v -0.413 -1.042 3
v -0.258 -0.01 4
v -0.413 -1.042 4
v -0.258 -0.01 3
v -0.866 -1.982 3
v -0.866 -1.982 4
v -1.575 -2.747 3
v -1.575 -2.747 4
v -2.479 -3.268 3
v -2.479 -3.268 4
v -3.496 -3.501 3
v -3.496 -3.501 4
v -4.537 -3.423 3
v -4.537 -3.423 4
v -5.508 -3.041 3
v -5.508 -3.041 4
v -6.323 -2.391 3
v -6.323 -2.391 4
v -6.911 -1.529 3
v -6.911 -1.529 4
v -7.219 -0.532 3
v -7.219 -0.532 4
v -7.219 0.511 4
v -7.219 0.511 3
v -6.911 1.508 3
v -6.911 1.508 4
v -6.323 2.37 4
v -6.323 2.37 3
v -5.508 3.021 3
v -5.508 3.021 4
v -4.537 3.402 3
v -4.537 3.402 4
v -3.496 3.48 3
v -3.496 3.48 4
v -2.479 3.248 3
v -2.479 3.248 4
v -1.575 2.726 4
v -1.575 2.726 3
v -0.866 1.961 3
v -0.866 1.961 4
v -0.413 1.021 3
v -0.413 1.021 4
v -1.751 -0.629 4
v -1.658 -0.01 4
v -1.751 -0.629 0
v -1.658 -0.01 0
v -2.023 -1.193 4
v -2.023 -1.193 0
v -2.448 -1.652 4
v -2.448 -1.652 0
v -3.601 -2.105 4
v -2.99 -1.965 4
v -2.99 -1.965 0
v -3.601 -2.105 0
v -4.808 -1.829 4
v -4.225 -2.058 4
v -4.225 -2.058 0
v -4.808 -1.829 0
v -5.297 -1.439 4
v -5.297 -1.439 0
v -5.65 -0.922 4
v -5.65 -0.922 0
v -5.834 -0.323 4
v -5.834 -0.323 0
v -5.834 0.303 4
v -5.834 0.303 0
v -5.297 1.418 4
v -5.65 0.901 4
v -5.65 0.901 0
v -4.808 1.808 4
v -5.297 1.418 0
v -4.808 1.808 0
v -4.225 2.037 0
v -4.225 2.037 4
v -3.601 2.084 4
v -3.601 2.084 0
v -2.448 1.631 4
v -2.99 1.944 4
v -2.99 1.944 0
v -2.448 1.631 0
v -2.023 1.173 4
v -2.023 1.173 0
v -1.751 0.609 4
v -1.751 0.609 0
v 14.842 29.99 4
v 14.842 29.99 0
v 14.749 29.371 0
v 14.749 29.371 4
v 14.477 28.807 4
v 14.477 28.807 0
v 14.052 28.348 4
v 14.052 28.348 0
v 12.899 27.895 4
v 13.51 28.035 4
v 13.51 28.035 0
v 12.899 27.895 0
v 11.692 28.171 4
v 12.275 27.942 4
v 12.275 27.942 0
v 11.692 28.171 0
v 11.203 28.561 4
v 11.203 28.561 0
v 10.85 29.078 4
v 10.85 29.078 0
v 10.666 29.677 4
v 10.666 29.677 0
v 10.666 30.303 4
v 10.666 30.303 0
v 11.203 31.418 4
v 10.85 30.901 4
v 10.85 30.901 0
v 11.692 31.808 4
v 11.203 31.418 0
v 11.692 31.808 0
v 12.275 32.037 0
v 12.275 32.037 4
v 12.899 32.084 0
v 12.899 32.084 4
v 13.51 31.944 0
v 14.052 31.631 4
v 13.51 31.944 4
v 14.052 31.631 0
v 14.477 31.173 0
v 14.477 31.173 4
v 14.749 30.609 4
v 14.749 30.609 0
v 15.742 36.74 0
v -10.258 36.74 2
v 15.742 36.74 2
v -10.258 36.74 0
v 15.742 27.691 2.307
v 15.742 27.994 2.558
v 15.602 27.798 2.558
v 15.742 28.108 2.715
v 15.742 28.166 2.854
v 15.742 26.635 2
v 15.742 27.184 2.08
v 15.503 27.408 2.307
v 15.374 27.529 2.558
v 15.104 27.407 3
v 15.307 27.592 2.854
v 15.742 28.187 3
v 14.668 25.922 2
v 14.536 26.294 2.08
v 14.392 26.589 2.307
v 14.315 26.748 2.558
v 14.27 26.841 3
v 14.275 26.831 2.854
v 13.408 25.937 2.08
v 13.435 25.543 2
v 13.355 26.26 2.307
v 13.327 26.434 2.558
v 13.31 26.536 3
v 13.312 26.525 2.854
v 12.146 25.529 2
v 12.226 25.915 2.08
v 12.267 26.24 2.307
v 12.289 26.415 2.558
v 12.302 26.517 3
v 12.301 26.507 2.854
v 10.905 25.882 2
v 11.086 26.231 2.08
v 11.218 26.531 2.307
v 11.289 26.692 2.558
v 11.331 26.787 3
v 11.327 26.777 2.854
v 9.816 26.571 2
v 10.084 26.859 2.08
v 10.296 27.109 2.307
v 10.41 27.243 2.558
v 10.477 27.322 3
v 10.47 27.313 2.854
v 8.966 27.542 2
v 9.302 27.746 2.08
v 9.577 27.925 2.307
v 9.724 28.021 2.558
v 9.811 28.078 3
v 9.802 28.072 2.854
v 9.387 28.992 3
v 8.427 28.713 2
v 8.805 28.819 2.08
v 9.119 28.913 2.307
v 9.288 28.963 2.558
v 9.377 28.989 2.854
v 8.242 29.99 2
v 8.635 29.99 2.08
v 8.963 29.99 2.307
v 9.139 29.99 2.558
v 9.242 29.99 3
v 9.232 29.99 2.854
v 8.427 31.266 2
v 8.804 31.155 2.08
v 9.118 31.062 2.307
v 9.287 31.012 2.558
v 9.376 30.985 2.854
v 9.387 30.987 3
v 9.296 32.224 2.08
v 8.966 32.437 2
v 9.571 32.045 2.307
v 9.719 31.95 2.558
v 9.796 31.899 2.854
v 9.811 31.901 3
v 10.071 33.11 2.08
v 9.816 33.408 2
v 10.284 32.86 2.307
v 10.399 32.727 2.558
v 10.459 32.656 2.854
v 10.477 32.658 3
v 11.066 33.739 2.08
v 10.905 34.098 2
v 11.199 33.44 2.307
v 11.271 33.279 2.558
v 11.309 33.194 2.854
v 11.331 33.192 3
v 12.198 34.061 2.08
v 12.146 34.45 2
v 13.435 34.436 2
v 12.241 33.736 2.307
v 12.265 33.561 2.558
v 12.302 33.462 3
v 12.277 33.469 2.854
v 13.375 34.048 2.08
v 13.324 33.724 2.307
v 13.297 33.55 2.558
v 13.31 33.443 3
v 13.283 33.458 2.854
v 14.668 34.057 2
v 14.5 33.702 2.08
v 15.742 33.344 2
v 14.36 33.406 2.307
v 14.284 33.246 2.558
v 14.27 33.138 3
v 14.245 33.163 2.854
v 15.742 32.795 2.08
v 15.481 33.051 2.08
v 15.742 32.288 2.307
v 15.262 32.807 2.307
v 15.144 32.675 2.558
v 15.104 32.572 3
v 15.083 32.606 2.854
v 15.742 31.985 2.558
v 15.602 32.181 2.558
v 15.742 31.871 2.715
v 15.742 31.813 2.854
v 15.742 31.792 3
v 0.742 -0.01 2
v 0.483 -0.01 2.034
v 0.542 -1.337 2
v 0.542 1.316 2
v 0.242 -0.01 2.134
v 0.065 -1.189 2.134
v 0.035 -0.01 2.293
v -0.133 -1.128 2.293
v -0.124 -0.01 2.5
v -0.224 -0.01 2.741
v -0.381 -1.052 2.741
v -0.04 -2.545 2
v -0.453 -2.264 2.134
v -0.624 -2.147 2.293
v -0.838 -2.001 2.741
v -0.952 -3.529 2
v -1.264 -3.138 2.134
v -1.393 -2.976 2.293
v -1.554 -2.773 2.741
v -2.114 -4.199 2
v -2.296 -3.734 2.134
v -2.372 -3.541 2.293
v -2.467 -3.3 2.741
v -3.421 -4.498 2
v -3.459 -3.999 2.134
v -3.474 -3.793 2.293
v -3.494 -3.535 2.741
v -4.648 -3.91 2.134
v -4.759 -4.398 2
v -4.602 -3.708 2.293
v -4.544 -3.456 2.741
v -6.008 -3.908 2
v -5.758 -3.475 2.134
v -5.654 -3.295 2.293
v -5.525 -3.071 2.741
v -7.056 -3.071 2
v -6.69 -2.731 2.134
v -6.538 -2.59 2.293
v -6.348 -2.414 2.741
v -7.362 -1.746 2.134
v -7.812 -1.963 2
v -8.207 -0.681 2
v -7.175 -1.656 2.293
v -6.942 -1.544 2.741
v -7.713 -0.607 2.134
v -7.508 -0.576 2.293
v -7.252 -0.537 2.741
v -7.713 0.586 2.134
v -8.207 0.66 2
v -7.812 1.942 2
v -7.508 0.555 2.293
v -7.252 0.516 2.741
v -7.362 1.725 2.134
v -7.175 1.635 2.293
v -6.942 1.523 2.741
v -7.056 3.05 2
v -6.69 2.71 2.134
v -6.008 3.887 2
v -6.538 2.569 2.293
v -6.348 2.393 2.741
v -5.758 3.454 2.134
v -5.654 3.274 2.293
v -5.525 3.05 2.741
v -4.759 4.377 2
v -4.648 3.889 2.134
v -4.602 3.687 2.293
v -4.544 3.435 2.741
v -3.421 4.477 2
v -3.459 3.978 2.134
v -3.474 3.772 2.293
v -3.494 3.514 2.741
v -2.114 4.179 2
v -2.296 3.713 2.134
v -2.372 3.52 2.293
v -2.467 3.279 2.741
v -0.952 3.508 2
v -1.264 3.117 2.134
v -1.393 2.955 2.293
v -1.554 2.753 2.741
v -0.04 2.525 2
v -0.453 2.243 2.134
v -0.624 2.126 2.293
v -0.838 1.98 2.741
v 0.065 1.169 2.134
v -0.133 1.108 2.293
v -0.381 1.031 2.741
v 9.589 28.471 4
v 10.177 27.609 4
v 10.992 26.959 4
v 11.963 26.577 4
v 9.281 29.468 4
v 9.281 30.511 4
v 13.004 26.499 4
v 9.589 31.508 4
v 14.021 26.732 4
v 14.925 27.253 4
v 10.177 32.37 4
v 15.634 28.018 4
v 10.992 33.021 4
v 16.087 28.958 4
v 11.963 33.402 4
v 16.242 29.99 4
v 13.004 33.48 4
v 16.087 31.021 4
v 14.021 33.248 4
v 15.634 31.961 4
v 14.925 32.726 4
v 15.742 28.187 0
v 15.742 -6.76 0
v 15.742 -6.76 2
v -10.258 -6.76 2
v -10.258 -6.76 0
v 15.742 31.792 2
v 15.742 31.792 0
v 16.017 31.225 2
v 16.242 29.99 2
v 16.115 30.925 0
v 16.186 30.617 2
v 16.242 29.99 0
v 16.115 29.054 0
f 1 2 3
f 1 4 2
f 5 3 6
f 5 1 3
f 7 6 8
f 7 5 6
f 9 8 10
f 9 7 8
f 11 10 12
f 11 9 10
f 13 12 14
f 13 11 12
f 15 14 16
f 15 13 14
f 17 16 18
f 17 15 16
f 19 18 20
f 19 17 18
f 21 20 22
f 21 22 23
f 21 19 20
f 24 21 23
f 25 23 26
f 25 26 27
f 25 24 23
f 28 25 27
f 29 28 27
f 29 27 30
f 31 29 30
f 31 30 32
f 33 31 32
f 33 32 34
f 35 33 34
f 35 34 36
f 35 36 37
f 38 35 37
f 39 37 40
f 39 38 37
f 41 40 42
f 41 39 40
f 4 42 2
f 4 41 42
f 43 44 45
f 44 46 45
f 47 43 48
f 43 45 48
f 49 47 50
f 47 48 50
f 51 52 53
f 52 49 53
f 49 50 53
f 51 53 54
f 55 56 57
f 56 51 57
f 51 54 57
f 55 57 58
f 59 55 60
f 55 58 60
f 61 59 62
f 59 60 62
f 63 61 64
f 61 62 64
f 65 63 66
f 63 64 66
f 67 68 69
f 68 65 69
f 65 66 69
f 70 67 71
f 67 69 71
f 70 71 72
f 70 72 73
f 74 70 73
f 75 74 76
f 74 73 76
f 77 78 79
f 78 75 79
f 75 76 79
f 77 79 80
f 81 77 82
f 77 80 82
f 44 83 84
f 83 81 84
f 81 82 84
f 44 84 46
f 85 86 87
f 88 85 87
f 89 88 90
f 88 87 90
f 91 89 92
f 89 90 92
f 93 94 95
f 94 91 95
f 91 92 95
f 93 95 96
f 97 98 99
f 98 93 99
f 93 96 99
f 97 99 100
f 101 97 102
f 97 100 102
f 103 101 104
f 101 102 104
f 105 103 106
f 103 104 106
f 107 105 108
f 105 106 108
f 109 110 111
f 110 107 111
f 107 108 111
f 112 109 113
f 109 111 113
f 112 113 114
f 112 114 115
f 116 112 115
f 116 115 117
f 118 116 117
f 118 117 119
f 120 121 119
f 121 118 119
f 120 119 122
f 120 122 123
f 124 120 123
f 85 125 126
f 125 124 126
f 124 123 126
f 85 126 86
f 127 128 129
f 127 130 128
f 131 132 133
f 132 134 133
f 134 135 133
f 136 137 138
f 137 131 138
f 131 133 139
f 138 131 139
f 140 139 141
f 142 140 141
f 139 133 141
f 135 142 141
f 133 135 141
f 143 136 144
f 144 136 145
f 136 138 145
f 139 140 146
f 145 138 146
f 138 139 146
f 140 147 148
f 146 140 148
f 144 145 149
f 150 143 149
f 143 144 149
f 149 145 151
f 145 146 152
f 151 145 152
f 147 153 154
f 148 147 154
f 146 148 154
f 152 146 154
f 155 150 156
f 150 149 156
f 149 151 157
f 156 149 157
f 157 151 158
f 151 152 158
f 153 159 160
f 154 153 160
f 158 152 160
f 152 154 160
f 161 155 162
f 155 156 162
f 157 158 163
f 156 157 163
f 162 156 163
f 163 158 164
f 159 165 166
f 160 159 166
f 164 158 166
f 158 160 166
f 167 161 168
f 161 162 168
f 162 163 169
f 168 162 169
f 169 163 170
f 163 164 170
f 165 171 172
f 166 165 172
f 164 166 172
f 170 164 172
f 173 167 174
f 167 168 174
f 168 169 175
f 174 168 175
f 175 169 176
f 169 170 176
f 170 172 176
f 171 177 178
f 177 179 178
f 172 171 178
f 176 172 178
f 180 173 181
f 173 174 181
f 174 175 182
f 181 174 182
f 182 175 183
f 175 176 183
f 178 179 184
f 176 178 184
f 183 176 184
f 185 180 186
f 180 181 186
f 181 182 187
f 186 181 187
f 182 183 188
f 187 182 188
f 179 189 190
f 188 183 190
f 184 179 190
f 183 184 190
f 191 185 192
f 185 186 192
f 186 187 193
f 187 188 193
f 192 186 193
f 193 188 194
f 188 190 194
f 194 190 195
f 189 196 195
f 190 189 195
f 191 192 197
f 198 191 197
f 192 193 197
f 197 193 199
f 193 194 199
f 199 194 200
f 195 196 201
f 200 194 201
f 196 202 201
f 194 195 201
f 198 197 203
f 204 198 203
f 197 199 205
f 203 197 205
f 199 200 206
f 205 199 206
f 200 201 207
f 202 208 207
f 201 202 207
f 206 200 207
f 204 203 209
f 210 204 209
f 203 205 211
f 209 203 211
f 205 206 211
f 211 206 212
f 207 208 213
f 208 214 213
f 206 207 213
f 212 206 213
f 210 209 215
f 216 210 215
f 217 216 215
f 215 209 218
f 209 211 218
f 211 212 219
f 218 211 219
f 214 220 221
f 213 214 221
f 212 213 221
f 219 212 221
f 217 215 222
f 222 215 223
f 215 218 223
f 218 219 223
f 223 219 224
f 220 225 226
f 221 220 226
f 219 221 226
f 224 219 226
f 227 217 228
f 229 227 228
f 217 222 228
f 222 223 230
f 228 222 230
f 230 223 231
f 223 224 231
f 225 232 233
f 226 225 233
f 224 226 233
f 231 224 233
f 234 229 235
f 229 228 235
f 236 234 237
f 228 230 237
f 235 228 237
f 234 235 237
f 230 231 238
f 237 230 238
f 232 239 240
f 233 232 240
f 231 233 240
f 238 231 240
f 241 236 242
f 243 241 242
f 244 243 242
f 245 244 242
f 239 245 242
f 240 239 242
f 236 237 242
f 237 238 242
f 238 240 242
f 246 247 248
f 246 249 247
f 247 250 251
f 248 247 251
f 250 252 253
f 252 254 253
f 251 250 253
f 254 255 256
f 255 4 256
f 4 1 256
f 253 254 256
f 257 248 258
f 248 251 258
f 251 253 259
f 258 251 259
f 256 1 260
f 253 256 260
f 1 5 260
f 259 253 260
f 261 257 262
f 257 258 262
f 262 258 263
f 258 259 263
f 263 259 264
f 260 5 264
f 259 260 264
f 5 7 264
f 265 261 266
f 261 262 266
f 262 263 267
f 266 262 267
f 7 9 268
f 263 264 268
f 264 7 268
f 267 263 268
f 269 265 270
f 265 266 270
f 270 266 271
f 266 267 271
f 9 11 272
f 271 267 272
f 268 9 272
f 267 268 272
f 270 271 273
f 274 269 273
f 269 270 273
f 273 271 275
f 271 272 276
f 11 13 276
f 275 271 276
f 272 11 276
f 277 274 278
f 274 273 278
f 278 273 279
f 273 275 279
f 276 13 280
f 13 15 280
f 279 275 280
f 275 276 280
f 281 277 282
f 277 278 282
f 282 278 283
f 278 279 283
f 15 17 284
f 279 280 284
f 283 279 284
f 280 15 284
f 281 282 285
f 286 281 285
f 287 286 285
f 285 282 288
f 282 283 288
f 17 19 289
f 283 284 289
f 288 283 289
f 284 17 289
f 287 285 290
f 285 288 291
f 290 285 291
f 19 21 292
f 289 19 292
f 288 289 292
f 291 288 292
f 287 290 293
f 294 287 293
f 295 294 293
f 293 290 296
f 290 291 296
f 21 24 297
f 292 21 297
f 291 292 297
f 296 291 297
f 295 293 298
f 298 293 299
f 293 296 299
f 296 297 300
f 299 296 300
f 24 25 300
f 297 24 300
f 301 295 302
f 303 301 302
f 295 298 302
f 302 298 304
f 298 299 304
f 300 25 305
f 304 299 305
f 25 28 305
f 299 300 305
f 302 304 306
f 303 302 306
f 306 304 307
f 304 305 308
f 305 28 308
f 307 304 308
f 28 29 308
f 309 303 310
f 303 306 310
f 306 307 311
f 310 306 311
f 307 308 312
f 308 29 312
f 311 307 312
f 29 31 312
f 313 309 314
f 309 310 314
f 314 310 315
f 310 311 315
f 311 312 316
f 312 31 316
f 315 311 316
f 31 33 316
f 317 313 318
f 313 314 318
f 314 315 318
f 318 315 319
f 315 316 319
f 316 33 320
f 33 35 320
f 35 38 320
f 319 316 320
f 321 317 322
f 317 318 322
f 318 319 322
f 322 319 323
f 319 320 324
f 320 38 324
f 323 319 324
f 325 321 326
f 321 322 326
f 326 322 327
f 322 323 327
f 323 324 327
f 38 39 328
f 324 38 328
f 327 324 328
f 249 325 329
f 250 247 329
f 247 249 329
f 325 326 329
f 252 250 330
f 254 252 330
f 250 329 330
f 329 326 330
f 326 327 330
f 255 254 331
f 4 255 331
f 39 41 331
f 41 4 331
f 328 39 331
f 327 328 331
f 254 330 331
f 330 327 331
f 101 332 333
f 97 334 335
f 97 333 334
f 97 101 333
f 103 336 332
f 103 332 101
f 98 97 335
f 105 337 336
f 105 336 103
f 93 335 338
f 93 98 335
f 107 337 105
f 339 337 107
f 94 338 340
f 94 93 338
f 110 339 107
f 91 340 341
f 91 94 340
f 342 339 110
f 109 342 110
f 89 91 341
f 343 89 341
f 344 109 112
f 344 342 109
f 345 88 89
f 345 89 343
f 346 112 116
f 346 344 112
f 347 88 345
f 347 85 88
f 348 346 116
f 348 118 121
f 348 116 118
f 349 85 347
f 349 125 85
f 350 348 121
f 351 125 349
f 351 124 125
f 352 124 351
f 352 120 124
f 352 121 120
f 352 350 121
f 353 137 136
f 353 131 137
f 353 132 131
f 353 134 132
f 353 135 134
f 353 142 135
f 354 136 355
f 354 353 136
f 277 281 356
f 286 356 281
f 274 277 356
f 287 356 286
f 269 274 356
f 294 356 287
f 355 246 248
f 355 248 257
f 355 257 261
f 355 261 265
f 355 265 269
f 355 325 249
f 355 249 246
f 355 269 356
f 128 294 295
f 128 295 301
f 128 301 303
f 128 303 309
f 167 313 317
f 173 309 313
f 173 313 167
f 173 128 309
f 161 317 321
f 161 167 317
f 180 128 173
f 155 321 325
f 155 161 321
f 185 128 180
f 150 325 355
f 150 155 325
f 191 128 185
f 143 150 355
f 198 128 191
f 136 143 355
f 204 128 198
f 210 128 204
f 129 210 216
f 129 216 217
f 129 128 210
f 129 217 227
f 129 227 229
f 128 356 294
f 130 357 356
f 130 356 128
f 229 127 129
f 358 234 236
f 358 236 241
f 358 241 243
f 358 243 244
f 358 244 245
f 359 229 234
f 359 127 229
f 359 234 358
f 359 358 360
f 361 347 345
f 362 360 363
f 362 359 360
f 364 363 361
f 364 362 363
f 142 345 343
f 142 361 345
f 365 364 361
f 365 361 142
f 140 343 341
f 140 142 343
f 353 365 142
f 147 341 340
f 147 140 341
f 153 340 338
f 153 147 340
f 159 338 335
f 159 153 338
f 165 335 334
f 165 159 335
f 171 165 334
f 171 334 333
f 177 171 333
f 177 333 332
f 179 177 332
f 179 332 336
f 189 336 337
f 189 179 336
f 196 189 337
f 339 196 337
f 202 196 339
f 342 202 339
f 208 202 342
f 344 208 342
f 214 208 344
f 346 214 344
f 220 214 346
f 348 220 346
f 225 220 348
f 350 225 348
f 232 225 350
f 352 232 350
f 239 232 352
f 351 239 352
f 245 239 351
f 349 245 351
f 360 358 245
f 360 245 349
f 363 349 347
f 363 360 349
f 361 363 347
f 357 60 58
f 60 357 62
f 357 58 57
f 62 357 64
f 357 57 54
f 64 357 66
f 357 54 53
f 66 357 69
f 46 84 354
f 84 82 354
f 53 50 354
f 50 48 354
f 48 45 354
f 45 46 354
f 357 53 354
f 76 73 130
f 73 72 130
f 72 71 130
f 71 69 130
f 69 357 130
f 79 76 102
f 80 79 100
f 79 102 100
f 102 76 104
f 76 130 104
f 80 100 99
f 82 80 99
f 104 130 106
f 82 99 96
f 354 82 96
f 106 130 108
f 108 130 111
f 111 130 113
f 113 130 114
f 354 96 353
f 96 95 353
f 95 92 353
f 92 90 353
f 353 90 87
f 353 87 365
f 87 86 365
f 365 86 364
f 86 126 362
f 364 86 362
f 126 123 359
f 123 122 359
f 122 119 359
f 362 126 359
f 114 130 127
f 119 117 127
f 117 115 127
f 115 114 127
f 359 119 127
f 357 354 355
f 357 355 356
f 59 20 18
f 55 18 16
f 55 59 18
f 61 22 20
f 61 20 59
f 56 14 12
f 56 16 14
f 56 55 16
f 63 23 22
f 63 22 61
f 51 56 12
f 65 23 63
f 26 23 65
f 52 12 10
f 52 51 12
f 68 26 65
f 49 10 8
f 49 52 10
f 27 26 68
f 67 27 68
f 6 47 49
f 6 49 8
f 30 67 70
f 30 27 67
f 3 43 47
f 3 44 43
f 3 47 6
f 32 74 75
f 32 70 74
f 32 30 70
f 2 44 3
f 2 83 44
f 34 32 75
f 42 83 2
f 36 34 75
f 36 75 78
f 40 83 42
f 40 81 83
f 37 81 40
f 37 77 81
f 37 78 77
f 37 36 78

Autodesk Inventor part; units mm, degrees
ref_plane "YZ Plane" through (0, 0, 0) normal (1, 0, 0) x (0, 1, 0)
ref_plane "XZ Plane" through (0, 0, 0) normal (0, 1, 0) x (-1, 0, 0)
ref_plane "XY Plane" through (0, 0, 0) normal (0, 0, 1) x (1, 0, 0)
sketch "Sketch1" plane through (0, 0, 0) normal (0, 0, 1) x (1, 0, 0)
  line L0 (-6.2577, 36.7396) -> (15.2423, 36.7396)
  line L1 (15.2423, 36.7396) -> (15.2423, -6.7604)
  line L2 (15.2423, -6.7604) -> (-6.2577, -6.7604)
  line L3 (-6.2577, -6.7604) -> (-6.2577, 36.7396)
  circle A0 centre (-3.7577, -0.0104) radius 2.1
  circle A1 centre (12.7423, 29.9896) radius 2.1
  circle A2 centre (12.7423, 29.9896) radius 3.5
  circle A3 centre (-3.7577, -0.0104) radius 3.5
  line L4 (-7.7577, 36.7396) -> (15.7423, 36.7396)
  line L5 (15.7423, 36.7396) -> (15.7423, -6.7604)
  line L6 (15.7423, -6.7604) -> (-7.7577, -6.7604)
  line L7 (-7.7577, -6.7604) -> (-7.7577, 36.7396)
  line L8 (-7.7577, -6.7604) -> (-10.2577, -6.7604)
  line L9 (-10.2577, -6.7604) -> (-10.2577, 36.7396)
  line L10 (-10.2577, 36.7396) -> (-7.7577, 36.7396)
  line L11 (-7.7577, 36.7396) -> (-7.7577, -6.7604)
  point P0 (0, 0)
  dimension "d0" = 21.5
  dimension "d1" = 43.5
  dimension "d2" = 6.75
  dimension "d3" = 6.75
  dimension "d4" = 2.5
  dimension "d5" = 2.5
  dimension "d6" = 7
  dimension "d7" = 7
  dimension "d8" = 0
  dimension "d9" = 1.5
  dimension "d10" = 0.5
  dimension "d11" = 0
  dimension "d12" = 2.5
  dimension "d20" = 4.2
  dimension "d21" = 4.2
  dimension "d22" = 43.5
extrude "Base" add sketch "Sketch1" along normal blind 2
extrude "Extrusion2" [suppressed]
extrude "Standoff" add sketch "Sketch1" along normal blind 4 contours A3 L3 | L3 A3 | A2 L5 L1 | L1 A2 | A2 L5
fillet "Fillet1" [suppressed]
fillet "Fillet2" radius 1 2 edges at (-7.2577, -0.0104, 2) (9.2423, 29.9896, 2)
equation "\"d2\" = d3"
equation "\"d22\" = d1"
properties part number "12v regulator bracket"
